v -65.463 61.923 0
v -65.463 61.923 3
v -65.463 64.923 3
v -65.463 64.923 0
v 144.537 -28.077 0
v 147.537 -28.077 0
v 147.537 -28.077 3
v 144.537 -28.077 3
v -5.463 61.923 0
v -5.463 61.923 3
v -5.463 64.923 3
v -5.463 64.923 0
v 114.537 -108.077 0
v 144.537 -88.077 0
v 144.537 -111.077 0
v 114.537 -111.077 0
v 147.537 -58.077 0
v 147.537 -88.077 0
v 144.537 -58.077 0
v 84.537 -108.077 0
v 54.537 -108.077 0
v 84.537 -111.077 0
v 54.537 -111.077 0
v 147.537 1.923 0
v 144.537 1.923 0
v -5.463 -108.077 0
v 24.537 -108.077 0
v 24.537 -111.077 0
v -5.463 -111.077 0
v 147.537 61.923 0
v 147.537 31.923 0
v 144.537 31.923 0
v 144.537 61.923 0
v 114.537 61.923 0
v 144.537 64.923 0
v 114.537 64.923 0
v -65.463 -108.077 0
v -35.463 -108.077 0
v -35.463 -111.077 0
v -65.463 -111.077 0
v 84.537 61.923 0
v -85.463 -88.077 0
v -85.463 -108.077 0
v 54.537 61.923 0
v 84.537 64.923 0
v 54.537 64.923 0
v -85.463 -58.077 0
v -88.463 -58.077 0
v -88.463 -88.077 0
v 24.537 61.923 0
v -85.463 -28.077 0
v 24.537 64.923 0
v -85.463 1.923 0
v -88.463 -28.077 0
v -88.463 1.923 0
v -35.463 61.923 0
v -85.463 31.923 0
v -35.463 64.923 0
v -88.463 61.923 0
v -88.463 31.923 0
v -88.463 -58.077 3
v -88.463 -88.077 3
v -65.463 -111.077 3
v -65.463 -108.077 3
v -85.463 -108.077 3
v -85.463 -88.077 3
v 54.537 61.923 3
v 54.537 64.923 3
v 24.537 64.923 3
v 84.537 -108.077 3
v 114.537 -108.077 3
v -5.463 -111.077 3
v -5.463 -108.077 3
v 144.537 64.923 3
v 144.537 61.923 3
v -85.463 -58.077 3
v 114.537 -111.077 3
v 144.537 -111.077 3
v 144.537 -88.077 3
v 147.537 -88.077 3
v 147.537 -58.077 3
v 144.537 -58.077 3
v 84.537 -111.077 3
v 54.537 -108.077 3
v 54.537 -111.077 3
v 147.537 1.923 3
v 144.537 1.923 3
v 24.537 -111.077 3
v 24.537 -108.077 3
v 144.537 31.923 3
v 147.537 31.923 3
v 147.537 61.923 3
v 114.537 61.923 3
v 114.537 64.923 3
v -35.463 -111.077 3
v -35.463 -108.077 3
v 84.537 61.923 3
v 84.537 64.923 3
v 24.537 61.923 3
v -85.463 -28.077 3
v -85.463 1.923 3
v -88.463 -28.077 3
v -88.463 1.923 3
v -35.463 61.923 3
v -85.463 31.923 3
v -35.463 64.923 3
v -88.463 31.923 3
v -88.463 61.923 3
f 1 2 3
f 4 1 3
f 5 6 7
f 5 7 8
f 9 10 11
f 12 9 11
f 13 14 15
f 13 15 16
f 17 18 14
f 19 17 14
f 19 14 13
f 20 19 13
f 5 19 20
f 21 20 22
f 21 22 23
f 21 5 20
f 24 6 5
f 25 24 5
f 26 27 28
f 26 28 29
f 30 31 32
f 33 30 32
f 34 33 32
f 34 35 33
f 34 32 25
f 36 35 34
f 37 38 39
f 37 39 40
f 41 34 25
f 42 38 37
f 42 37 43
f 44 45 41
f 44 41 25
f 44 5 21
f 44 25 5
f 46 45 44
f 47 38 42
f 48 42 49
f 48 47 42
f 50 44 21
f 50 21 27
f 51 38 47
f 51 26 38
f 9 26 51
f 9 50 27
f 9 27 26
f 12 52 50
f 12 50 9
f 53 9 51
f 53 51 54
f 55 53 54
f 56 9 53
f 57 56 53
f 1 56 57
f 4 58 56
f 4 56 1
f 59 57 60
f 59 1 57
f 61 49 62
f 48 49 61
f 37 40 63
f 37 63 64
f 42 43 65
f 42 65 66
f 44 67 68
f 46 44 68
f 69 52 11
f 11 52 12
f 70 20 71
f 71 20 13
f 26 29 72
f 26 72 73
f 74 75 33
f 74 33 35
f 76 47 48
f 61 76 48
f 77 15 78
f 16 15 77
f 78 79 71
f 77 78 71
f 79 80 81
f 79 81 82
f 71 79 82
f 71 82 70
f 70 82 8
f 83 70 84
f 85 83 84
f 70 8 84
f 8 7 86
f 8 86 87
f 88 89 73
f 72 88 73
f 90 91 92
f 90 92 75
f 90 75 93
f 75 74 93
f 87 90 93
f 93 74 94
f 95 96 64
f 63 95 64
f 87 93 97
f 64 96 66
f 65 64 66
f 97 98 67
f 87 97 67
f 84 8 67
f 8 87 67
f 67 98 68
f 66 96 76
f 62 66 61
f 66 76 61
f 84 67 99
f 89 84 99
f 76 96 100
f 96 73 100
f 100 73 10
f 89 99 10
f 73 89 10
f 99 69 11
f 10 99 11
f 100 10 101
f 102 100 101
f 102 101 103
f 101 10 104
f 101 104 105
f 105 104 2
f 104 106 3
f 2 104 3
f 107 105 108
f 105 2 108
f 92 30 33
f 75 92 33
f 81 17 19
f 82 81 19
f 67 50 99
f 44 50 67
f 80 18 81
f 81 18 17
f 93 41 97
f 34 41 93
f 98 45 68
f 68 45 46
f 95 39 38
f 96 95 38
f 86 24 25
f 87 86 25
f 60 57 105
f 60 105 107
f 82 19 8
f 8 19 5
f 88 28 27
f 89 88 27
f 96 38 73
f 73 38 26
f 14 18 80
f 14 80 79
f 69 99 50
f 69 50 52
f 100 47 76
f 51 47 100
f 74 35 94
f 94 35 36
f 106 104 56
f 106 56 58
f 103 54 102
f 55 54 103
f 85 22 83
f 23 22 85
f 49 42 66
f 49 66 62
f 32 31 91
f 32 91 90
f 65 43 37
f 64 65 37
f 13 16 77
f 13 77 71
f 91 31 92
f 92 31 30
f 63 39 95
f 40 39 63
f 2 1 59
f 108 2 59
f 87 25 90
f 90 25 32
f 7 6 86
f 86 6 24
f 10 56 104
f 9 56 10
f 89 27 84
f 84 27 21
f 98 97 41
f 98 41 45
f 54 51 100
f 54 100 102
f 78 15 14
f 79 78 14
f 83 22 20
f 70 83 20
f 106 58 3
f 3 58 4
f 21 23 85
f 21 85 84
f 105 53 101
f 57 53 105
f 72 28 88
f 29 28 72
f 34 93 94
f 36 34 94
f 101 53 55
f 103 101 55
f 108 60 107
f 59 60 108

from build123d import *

# Parameters (mm, degrees)
ESQUISSE1_W        = 230
ESQUISSE1_H        = 170
BOSS_EXTRU_1_DEPTH = 3
ESQUISSE2_W        = 30
ESQUISSE2_H        = 3
BOSS_EXTRU_6_DEPTH = 3
ESQUISSE4_W        = 3
ESQUISSE4_H        = 30
BOSS_EXTRU_7_DEPTH = 3


with BuildPart() as part:
    # Esquisse1 → Boss.-Extru.1 (new body)
    with BuildSketch(Plane.XY):
        with Locations((29.537157757, -23.076923077)):
            Rectangle(ESQUISSE1_W, ESQUISSE1_H)
    extrude(amount=BOSS_EXTRU_1_DEPTH)

    # Esquisse2 → Boss.-Extru.6 (add)
    with BuildSketch(Plane(origin=(0, 0, 0), x_dir=(-1, 0, 0), z_dir=(0, 0, -1))):
        with Locations((-129.537157757, 63.423076923)):
            Rectangle(ESQUISSE2_W, ESQUISSE2_H)
        with Locations((-69.537157757, 63.423076923)):
            Rectangle(ESQUISSE2_W, ESQUISSE2_H)
        with Locations((-9.537157757, 63.423076923)):
            Rectangle(ESQUISSE2_W, ESQUISSE2_H)
        with Locations((50.462842243, 63.423076923)):
            Rectangle(ESQUISSE2_W, ESQUISSE2_H)
        with Locations((50.462842243, -109.576923077)):
            Rectangle(ESQUISSE2_W, ESQUISSE2_H)
        with Locations((-129.537157757, -109.576923077)):
            Rectangle(ESQUISSE2_W, ESQUISSE2_H)
        with Locations((-69.537157757, -109.576923077)):
            Rectangle(ESQUISSE2_W, ESQUISSE2_H)
        with Locations((-9.537157757, -109.576923077)):
            Rectangle(ESQUISSE2_W, ESQUISSE2_H)
    extrude(amount=-BOSS_EXTRU_6_DEPTH)

    # Esquisse4 → Boss.-Extru.7 (add)
    with BuildSketch(Plane(origin=(0, 0, 0), x_dir=(-1, 0, 0), z_dir=(0, 0, -1))):
        with Locations((86.962842243, 46.923076923)):
            Rectangle(ESQUISSE4_W, ESQUISSE4_H)
        with Locations((86.962842243, -13.076923077)):
            Rectangle(ESQUISSE4_W, ESQUISSE4_H)
        with Locations((86.962842243, -73.076923077)):
            Rectangle(ESQUISSE4_W, ESQUISSE4_H)
        with Locations((-146.037157757, 46.923076923)):
            Rectangle(ESQUISSE4_W, ESQUISSE4_H)
        with Locations((-146.037157757, -13.076923077)):
            Rectangle(ESQUISSE4_W, ESQUISSE4_H)
        with Locations((-146.037157757, -73.076923077)):
            Rectangle(ESQUISSE4_W, ESQUISSE4_H)
    extrude(amount=-BOSS_EXTRU_7_DEPTH)


solid = part.part
